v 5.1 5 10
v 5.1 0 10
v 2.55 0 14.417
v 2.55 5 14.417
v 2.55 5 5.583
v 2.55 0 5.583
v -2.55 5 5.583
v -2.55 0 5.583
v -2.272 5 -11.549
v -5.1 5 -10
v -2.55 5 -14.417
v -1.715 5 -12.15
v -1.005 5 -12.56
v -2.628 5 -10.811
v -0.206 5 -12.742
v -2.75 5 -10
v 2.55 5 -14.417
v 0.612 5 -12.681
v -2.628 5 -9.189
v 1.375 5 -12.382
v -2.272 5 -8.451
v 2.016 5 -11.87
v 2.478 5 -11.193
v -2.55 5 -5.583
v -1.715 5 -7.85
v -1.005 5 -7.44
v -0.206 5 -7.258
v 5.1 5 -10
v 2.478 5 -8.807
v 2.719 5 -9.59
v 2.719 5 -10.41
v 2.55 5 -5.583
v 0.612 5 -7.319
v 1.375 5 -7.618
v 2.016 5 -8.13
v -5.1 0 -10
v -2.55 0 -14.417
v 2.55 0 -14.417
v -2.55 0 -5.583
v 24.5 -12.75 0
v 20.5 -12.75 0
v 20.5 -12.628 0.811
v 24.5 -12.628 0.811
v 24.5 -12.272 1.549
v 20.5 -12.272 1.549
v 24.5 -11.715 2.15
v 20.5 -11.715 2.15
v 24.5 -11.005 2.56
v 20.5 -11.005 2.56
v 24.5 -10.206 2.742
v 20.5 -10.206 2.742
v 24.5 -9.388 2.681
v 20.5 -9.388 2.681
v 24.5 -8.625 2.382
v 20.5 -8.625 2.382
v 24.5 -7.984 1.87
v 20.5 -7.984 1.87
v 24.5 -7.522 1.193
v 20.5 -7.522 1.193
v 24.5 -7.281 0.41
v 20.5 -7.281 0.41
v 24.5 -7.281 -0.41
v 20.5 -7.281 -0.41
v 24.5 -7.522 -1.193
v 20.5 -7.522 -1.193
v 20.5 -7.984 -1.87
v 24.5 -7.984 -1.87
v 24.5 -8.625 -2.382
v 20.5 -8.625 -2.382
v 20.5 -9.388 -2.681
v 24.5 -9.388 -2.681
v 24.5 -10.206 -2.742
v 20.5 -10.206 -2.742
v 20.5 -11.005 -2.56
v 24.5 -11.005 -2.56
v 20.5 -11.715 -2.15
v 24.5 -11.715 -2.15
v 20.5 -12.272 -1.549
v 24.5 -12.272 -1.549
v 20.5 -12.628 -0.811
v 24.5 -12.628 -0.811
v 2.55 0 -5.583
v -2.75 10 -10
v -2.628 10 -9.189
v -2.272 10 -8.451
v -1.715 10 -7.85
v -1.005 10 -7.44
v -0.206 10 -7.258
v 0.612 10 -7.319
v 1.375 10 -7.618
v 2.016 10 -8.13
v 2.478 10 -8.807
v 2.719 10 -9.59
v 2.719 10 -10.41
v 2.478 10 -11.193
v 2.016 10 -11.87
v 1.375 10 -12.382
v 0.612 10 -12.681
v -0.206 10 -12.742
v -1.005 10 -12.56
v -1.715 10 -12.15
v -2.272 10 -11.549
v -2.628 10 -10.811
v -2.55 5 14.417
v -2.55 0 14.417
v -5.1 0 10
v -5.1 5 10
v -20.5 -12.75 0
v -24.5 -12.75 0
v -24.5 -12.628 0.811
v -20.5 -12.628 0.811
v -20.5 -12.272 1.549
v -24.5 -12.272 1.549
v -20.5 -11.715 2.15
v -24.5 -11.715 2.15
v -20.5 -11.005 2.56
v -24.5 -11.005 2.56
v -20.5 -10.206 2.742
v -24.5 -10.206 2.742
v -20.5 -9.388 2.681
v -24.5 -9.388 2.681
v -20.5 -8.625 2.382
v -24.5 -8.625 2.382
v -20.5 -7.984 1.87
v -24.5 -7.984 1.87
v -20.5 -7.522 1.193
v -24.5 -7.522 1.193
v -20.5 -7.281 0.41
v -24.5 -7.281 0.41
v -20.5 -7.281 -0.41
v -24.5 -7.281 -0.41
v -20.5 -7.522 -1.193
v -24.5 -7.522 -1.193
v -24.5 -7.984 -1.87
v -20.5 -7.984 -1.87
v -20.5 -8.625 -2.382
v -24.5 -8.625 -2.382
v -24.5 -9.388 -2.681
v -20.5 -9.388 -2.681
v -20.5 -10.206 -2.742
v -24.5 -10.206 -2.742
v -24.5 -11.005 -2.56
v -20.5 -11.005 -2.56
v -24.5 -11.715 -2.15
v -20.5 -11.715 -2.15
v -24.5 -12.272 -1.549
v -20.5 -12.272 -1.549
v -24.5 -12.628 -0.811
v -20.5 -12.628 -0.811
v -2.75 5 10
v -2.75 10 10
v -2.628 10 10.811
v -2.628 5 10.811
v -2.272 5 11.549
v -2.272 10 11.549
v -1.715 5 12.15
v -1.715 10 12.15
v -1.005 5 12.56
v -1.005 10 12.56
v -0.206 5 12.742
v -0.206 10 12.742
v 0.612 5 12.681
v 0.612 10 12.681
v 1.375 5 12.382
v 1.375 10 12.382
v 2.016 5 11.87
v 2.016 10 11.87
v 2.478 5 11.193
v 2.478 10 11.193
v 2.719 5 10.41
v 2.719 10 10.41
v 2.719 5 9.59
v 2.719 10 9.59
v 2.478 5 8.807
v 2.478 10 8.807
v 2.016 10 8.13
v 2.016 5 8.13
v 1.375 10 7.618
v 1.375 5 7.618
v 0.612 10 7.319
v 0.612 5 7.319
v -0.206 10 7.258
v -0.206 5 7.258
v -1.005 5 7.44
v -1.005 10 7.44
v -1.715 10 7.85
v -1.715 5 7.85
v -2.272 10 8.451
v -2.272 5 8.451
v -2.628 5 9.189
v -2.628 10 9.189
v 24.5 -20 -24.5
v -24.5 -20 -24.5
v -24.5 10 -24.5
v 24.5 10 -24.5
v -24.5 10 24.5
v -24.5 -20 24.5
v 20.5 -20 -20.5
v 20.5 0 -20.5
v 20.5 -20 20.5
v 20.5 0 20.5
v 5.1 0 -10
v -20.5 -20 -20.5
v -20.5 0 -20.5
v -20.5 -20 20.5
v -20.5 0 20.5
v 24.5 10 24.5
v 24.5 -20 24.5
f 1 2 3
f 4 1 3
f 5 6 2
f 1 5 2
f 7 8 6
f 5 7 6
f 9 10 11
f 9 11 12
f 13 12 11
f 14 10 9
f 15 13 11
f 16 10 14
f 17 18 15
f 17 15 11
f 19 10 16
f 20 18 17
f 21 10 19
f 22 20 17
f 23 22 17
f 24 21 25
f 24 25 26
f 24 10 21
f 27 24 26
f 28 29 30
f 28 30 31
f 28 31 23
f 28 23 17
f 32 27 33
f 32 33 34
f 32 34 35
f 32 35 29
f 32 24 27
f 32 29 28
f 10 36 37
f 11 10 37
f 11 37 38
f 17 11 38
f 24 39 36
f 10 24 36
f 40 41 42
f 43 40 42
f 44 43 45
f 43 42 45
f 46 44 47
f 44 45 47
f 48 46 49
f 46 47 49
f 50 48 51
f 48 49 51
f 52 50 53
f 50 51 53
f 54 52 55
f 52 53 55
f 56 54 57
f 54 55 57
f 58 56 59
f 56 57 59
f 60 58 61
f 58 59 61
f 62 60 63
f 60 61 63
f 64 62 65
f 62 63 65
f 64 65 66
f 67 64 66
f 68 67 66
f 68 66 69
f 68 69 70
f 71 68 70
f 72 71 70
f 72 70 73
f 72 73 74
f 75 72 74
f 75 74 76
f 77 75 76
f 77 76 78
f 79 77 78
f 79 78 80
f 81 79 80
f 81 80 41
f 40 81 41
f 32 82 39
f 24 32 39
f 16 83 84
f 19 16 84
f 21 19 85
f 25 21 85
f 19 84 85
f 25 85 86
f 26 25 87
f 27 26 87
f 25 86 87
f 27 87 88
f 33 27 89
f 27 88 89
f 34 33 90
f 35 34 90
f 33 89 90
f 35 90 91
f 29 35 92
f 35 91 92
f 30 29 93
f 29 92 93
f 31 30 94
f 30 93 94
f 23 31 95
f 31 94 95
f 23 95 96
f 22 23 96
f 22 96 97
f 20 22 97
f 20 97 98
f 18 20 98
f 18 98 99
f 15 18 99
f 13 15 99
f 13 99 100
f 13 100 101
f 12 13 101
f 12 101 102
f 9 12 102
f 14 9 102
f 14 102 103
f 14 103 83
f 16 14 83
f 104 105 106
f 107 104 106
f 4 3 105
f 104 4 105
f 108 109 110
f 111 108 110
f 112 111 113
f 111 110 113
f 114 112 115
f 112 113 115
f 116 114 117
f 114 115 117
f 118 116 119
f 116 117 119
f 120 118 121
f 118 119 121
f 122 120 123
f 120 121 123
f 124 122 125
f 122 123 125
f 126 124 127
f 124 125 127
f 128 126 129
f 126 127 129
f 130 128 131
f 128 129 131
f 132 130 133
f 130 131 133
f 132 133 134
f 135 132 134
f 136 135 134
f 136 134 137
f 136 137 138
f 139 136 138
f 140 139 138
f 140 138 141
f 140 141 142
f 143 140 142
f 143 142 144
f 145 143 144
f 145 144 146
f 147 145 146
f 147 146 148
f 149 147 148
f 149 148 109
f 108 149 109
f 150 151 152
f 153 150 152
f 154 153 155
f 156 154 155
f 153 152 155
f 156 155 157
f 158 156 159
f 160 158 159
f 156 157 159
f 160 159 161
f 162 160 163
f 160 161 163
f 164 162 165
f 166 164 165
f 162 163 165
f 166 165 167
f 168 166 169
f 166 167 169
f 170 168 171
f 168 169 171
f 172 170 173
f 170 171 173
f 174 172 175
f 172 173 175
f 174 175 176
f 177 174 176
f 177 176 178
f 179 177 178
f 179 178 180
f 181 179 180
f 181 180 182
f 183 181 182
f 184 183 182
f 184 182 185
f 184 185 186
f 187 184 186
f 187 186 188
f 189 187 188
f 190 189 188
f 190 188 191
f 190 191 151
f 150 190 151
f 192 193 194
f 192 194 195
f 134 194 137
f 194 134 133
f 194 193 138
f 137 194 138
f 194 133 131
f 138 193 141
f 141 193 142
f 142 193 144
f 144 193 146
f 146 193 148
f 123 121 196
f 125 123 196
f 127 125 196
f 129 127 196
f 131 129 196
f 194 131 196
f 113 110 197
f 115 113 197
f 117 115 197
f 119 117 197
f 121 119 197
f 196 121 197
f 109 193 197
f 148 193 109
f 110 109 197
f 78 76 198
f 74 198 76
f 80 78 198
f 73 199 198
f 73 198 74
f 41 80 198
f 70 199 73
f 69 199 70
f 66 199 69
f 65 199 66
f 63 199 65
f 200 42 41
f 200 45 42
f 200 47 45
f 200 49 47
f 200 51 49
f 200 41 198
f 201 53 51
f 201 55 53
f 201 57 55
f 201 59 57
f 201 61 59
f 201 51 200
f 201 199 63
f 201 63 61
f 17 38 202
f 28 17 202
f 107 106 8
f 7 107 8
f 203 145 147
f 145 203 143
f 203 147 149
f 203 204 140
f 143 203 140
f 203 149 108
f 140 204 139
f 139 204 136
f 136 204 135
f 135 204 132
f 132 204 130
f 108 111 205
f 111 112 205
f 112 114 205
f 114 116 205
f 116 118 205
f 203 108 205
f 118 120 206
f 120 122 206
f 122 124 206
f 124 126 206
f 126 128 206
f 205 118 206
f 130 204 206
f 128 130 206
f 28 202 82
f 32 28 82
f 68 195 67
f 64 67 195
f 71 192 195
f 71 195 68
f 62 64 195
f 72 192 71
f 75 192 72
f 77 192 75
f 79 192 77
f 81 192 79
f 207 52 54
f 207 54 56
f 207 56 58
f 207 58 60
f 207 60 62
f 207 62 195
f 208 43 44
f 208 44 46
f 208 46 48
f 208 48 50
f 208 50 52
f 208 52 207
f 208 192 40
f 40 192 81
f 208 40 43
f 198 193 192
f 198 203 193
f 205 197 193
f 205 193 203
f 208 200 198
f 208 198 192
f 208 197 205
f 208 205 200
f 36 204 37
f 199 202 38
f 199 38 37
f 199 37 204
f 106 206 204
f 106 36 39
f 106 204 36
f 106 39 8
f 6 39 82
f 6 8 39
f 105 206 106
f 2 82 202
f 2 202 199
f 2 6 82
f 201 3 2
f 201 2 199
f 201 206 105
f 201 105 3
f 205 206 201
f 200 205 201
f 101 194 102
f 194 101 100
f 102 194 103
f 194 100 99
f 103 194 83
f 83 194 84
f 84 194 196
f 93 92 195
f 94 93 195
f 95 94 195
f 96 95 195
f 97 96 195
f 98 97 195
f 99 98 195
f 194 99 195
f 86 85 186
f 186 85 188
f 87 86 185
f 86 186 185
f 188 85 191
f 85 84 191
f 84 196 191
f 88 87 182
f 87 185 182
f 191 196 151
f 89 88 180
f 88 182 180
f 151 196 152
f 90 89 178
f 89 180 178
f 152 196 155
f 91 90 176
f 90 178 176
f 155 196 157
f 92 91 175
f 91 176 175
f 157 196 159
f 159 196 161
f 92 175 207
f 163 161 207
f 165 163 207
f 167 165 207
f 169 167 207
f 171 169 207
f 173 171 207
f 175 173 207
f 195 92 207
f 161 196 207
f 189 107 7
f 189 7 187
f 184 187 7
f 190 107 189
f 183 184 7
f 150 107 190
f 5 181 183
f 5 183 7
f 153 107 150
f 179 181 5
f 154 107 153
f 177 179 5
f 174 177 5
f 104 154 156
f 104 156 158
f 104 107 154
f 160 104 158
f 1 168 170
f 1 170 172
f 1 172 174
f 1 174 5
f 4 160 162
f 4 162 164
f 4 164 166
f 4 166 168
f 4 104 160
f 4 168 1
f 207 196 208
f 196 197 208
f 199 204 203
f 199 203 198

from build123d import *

# Parameters (mm, degrees)
F0_W     = 49
F0_H     = 49
F0_W_2   = 41
F0_H_2   = 41
F1_DEPTH = 20
F2_DEPTH = 10
F3_D     = 5.5
F5_D     = 5.5
F7_DEPTH = 5


with BuildPart() as f1:
    # F0 (on Front) → F1 (new body)
    with BuildSketch(Plane.XZ):
        Rectangle(F0_W, F0_H)
        Rectangle(F0_W_2, F0_H_2, mode=Mode.SUBTRACT)
    extrude(amount=F1_DEPTH)

    # F0 (on Front) → F2 (join)
    with BuildSketch(Plane.XZ):
        Rectangle(F0_W, F0_H)
        Rectangle(F0_W_2, F0_H_2, mode=Mode.SUBTRACT)
        Rectangle(F0_W_2, F0_H_2)
    extrude(amount=-F2_DEPTH)

    # F3 (through all)
    with Locations(Plane.XZ):
        with Locations((0, 10), (0, -10)):
            Hole(F3_D / 2)

    # F5 (through all)
    with Locations(Plane.YZ.offset(24.5)):
        with Locations((-10, 0)):
            Hole(F5_D / 2)


with BuildPart() as f7:
    # F6 (on face) → F7 (new body)
    with BuildSketch(Plane.XZ):
        Polygon((5.1, 10), (2.55, 14.4167295593), (-2.55, 14.4167295593), (-5.1, 10), (-2.55, 5.5832704407), (2.55, 5.5832704407), align=None)
    extrude(amount=-F7_DEPTH)


with BuildPart() as f7b:
    # F6 (on face) → F7, piece 2 (new body)
    with BuildSketch(Plane.XZ):
        Polygon((5.1, -10), (2.55, -5.5832704407), (-2.55, -5.5832704407), (-5.1, -10), (-2.55, -14.4167295593), (2.55, -14.4167295593), align=None)
    extrude(amount=-F7_DEPTH)


with BuildPart() as f1_1:
    add(f1.part)

    # F8: cut F7, F7b
    add(f7.part, mode=Mode.SUBTRACT)
    add(f7b.part, mode=Mode.SUBTRACT)


solid = f1_1.part
